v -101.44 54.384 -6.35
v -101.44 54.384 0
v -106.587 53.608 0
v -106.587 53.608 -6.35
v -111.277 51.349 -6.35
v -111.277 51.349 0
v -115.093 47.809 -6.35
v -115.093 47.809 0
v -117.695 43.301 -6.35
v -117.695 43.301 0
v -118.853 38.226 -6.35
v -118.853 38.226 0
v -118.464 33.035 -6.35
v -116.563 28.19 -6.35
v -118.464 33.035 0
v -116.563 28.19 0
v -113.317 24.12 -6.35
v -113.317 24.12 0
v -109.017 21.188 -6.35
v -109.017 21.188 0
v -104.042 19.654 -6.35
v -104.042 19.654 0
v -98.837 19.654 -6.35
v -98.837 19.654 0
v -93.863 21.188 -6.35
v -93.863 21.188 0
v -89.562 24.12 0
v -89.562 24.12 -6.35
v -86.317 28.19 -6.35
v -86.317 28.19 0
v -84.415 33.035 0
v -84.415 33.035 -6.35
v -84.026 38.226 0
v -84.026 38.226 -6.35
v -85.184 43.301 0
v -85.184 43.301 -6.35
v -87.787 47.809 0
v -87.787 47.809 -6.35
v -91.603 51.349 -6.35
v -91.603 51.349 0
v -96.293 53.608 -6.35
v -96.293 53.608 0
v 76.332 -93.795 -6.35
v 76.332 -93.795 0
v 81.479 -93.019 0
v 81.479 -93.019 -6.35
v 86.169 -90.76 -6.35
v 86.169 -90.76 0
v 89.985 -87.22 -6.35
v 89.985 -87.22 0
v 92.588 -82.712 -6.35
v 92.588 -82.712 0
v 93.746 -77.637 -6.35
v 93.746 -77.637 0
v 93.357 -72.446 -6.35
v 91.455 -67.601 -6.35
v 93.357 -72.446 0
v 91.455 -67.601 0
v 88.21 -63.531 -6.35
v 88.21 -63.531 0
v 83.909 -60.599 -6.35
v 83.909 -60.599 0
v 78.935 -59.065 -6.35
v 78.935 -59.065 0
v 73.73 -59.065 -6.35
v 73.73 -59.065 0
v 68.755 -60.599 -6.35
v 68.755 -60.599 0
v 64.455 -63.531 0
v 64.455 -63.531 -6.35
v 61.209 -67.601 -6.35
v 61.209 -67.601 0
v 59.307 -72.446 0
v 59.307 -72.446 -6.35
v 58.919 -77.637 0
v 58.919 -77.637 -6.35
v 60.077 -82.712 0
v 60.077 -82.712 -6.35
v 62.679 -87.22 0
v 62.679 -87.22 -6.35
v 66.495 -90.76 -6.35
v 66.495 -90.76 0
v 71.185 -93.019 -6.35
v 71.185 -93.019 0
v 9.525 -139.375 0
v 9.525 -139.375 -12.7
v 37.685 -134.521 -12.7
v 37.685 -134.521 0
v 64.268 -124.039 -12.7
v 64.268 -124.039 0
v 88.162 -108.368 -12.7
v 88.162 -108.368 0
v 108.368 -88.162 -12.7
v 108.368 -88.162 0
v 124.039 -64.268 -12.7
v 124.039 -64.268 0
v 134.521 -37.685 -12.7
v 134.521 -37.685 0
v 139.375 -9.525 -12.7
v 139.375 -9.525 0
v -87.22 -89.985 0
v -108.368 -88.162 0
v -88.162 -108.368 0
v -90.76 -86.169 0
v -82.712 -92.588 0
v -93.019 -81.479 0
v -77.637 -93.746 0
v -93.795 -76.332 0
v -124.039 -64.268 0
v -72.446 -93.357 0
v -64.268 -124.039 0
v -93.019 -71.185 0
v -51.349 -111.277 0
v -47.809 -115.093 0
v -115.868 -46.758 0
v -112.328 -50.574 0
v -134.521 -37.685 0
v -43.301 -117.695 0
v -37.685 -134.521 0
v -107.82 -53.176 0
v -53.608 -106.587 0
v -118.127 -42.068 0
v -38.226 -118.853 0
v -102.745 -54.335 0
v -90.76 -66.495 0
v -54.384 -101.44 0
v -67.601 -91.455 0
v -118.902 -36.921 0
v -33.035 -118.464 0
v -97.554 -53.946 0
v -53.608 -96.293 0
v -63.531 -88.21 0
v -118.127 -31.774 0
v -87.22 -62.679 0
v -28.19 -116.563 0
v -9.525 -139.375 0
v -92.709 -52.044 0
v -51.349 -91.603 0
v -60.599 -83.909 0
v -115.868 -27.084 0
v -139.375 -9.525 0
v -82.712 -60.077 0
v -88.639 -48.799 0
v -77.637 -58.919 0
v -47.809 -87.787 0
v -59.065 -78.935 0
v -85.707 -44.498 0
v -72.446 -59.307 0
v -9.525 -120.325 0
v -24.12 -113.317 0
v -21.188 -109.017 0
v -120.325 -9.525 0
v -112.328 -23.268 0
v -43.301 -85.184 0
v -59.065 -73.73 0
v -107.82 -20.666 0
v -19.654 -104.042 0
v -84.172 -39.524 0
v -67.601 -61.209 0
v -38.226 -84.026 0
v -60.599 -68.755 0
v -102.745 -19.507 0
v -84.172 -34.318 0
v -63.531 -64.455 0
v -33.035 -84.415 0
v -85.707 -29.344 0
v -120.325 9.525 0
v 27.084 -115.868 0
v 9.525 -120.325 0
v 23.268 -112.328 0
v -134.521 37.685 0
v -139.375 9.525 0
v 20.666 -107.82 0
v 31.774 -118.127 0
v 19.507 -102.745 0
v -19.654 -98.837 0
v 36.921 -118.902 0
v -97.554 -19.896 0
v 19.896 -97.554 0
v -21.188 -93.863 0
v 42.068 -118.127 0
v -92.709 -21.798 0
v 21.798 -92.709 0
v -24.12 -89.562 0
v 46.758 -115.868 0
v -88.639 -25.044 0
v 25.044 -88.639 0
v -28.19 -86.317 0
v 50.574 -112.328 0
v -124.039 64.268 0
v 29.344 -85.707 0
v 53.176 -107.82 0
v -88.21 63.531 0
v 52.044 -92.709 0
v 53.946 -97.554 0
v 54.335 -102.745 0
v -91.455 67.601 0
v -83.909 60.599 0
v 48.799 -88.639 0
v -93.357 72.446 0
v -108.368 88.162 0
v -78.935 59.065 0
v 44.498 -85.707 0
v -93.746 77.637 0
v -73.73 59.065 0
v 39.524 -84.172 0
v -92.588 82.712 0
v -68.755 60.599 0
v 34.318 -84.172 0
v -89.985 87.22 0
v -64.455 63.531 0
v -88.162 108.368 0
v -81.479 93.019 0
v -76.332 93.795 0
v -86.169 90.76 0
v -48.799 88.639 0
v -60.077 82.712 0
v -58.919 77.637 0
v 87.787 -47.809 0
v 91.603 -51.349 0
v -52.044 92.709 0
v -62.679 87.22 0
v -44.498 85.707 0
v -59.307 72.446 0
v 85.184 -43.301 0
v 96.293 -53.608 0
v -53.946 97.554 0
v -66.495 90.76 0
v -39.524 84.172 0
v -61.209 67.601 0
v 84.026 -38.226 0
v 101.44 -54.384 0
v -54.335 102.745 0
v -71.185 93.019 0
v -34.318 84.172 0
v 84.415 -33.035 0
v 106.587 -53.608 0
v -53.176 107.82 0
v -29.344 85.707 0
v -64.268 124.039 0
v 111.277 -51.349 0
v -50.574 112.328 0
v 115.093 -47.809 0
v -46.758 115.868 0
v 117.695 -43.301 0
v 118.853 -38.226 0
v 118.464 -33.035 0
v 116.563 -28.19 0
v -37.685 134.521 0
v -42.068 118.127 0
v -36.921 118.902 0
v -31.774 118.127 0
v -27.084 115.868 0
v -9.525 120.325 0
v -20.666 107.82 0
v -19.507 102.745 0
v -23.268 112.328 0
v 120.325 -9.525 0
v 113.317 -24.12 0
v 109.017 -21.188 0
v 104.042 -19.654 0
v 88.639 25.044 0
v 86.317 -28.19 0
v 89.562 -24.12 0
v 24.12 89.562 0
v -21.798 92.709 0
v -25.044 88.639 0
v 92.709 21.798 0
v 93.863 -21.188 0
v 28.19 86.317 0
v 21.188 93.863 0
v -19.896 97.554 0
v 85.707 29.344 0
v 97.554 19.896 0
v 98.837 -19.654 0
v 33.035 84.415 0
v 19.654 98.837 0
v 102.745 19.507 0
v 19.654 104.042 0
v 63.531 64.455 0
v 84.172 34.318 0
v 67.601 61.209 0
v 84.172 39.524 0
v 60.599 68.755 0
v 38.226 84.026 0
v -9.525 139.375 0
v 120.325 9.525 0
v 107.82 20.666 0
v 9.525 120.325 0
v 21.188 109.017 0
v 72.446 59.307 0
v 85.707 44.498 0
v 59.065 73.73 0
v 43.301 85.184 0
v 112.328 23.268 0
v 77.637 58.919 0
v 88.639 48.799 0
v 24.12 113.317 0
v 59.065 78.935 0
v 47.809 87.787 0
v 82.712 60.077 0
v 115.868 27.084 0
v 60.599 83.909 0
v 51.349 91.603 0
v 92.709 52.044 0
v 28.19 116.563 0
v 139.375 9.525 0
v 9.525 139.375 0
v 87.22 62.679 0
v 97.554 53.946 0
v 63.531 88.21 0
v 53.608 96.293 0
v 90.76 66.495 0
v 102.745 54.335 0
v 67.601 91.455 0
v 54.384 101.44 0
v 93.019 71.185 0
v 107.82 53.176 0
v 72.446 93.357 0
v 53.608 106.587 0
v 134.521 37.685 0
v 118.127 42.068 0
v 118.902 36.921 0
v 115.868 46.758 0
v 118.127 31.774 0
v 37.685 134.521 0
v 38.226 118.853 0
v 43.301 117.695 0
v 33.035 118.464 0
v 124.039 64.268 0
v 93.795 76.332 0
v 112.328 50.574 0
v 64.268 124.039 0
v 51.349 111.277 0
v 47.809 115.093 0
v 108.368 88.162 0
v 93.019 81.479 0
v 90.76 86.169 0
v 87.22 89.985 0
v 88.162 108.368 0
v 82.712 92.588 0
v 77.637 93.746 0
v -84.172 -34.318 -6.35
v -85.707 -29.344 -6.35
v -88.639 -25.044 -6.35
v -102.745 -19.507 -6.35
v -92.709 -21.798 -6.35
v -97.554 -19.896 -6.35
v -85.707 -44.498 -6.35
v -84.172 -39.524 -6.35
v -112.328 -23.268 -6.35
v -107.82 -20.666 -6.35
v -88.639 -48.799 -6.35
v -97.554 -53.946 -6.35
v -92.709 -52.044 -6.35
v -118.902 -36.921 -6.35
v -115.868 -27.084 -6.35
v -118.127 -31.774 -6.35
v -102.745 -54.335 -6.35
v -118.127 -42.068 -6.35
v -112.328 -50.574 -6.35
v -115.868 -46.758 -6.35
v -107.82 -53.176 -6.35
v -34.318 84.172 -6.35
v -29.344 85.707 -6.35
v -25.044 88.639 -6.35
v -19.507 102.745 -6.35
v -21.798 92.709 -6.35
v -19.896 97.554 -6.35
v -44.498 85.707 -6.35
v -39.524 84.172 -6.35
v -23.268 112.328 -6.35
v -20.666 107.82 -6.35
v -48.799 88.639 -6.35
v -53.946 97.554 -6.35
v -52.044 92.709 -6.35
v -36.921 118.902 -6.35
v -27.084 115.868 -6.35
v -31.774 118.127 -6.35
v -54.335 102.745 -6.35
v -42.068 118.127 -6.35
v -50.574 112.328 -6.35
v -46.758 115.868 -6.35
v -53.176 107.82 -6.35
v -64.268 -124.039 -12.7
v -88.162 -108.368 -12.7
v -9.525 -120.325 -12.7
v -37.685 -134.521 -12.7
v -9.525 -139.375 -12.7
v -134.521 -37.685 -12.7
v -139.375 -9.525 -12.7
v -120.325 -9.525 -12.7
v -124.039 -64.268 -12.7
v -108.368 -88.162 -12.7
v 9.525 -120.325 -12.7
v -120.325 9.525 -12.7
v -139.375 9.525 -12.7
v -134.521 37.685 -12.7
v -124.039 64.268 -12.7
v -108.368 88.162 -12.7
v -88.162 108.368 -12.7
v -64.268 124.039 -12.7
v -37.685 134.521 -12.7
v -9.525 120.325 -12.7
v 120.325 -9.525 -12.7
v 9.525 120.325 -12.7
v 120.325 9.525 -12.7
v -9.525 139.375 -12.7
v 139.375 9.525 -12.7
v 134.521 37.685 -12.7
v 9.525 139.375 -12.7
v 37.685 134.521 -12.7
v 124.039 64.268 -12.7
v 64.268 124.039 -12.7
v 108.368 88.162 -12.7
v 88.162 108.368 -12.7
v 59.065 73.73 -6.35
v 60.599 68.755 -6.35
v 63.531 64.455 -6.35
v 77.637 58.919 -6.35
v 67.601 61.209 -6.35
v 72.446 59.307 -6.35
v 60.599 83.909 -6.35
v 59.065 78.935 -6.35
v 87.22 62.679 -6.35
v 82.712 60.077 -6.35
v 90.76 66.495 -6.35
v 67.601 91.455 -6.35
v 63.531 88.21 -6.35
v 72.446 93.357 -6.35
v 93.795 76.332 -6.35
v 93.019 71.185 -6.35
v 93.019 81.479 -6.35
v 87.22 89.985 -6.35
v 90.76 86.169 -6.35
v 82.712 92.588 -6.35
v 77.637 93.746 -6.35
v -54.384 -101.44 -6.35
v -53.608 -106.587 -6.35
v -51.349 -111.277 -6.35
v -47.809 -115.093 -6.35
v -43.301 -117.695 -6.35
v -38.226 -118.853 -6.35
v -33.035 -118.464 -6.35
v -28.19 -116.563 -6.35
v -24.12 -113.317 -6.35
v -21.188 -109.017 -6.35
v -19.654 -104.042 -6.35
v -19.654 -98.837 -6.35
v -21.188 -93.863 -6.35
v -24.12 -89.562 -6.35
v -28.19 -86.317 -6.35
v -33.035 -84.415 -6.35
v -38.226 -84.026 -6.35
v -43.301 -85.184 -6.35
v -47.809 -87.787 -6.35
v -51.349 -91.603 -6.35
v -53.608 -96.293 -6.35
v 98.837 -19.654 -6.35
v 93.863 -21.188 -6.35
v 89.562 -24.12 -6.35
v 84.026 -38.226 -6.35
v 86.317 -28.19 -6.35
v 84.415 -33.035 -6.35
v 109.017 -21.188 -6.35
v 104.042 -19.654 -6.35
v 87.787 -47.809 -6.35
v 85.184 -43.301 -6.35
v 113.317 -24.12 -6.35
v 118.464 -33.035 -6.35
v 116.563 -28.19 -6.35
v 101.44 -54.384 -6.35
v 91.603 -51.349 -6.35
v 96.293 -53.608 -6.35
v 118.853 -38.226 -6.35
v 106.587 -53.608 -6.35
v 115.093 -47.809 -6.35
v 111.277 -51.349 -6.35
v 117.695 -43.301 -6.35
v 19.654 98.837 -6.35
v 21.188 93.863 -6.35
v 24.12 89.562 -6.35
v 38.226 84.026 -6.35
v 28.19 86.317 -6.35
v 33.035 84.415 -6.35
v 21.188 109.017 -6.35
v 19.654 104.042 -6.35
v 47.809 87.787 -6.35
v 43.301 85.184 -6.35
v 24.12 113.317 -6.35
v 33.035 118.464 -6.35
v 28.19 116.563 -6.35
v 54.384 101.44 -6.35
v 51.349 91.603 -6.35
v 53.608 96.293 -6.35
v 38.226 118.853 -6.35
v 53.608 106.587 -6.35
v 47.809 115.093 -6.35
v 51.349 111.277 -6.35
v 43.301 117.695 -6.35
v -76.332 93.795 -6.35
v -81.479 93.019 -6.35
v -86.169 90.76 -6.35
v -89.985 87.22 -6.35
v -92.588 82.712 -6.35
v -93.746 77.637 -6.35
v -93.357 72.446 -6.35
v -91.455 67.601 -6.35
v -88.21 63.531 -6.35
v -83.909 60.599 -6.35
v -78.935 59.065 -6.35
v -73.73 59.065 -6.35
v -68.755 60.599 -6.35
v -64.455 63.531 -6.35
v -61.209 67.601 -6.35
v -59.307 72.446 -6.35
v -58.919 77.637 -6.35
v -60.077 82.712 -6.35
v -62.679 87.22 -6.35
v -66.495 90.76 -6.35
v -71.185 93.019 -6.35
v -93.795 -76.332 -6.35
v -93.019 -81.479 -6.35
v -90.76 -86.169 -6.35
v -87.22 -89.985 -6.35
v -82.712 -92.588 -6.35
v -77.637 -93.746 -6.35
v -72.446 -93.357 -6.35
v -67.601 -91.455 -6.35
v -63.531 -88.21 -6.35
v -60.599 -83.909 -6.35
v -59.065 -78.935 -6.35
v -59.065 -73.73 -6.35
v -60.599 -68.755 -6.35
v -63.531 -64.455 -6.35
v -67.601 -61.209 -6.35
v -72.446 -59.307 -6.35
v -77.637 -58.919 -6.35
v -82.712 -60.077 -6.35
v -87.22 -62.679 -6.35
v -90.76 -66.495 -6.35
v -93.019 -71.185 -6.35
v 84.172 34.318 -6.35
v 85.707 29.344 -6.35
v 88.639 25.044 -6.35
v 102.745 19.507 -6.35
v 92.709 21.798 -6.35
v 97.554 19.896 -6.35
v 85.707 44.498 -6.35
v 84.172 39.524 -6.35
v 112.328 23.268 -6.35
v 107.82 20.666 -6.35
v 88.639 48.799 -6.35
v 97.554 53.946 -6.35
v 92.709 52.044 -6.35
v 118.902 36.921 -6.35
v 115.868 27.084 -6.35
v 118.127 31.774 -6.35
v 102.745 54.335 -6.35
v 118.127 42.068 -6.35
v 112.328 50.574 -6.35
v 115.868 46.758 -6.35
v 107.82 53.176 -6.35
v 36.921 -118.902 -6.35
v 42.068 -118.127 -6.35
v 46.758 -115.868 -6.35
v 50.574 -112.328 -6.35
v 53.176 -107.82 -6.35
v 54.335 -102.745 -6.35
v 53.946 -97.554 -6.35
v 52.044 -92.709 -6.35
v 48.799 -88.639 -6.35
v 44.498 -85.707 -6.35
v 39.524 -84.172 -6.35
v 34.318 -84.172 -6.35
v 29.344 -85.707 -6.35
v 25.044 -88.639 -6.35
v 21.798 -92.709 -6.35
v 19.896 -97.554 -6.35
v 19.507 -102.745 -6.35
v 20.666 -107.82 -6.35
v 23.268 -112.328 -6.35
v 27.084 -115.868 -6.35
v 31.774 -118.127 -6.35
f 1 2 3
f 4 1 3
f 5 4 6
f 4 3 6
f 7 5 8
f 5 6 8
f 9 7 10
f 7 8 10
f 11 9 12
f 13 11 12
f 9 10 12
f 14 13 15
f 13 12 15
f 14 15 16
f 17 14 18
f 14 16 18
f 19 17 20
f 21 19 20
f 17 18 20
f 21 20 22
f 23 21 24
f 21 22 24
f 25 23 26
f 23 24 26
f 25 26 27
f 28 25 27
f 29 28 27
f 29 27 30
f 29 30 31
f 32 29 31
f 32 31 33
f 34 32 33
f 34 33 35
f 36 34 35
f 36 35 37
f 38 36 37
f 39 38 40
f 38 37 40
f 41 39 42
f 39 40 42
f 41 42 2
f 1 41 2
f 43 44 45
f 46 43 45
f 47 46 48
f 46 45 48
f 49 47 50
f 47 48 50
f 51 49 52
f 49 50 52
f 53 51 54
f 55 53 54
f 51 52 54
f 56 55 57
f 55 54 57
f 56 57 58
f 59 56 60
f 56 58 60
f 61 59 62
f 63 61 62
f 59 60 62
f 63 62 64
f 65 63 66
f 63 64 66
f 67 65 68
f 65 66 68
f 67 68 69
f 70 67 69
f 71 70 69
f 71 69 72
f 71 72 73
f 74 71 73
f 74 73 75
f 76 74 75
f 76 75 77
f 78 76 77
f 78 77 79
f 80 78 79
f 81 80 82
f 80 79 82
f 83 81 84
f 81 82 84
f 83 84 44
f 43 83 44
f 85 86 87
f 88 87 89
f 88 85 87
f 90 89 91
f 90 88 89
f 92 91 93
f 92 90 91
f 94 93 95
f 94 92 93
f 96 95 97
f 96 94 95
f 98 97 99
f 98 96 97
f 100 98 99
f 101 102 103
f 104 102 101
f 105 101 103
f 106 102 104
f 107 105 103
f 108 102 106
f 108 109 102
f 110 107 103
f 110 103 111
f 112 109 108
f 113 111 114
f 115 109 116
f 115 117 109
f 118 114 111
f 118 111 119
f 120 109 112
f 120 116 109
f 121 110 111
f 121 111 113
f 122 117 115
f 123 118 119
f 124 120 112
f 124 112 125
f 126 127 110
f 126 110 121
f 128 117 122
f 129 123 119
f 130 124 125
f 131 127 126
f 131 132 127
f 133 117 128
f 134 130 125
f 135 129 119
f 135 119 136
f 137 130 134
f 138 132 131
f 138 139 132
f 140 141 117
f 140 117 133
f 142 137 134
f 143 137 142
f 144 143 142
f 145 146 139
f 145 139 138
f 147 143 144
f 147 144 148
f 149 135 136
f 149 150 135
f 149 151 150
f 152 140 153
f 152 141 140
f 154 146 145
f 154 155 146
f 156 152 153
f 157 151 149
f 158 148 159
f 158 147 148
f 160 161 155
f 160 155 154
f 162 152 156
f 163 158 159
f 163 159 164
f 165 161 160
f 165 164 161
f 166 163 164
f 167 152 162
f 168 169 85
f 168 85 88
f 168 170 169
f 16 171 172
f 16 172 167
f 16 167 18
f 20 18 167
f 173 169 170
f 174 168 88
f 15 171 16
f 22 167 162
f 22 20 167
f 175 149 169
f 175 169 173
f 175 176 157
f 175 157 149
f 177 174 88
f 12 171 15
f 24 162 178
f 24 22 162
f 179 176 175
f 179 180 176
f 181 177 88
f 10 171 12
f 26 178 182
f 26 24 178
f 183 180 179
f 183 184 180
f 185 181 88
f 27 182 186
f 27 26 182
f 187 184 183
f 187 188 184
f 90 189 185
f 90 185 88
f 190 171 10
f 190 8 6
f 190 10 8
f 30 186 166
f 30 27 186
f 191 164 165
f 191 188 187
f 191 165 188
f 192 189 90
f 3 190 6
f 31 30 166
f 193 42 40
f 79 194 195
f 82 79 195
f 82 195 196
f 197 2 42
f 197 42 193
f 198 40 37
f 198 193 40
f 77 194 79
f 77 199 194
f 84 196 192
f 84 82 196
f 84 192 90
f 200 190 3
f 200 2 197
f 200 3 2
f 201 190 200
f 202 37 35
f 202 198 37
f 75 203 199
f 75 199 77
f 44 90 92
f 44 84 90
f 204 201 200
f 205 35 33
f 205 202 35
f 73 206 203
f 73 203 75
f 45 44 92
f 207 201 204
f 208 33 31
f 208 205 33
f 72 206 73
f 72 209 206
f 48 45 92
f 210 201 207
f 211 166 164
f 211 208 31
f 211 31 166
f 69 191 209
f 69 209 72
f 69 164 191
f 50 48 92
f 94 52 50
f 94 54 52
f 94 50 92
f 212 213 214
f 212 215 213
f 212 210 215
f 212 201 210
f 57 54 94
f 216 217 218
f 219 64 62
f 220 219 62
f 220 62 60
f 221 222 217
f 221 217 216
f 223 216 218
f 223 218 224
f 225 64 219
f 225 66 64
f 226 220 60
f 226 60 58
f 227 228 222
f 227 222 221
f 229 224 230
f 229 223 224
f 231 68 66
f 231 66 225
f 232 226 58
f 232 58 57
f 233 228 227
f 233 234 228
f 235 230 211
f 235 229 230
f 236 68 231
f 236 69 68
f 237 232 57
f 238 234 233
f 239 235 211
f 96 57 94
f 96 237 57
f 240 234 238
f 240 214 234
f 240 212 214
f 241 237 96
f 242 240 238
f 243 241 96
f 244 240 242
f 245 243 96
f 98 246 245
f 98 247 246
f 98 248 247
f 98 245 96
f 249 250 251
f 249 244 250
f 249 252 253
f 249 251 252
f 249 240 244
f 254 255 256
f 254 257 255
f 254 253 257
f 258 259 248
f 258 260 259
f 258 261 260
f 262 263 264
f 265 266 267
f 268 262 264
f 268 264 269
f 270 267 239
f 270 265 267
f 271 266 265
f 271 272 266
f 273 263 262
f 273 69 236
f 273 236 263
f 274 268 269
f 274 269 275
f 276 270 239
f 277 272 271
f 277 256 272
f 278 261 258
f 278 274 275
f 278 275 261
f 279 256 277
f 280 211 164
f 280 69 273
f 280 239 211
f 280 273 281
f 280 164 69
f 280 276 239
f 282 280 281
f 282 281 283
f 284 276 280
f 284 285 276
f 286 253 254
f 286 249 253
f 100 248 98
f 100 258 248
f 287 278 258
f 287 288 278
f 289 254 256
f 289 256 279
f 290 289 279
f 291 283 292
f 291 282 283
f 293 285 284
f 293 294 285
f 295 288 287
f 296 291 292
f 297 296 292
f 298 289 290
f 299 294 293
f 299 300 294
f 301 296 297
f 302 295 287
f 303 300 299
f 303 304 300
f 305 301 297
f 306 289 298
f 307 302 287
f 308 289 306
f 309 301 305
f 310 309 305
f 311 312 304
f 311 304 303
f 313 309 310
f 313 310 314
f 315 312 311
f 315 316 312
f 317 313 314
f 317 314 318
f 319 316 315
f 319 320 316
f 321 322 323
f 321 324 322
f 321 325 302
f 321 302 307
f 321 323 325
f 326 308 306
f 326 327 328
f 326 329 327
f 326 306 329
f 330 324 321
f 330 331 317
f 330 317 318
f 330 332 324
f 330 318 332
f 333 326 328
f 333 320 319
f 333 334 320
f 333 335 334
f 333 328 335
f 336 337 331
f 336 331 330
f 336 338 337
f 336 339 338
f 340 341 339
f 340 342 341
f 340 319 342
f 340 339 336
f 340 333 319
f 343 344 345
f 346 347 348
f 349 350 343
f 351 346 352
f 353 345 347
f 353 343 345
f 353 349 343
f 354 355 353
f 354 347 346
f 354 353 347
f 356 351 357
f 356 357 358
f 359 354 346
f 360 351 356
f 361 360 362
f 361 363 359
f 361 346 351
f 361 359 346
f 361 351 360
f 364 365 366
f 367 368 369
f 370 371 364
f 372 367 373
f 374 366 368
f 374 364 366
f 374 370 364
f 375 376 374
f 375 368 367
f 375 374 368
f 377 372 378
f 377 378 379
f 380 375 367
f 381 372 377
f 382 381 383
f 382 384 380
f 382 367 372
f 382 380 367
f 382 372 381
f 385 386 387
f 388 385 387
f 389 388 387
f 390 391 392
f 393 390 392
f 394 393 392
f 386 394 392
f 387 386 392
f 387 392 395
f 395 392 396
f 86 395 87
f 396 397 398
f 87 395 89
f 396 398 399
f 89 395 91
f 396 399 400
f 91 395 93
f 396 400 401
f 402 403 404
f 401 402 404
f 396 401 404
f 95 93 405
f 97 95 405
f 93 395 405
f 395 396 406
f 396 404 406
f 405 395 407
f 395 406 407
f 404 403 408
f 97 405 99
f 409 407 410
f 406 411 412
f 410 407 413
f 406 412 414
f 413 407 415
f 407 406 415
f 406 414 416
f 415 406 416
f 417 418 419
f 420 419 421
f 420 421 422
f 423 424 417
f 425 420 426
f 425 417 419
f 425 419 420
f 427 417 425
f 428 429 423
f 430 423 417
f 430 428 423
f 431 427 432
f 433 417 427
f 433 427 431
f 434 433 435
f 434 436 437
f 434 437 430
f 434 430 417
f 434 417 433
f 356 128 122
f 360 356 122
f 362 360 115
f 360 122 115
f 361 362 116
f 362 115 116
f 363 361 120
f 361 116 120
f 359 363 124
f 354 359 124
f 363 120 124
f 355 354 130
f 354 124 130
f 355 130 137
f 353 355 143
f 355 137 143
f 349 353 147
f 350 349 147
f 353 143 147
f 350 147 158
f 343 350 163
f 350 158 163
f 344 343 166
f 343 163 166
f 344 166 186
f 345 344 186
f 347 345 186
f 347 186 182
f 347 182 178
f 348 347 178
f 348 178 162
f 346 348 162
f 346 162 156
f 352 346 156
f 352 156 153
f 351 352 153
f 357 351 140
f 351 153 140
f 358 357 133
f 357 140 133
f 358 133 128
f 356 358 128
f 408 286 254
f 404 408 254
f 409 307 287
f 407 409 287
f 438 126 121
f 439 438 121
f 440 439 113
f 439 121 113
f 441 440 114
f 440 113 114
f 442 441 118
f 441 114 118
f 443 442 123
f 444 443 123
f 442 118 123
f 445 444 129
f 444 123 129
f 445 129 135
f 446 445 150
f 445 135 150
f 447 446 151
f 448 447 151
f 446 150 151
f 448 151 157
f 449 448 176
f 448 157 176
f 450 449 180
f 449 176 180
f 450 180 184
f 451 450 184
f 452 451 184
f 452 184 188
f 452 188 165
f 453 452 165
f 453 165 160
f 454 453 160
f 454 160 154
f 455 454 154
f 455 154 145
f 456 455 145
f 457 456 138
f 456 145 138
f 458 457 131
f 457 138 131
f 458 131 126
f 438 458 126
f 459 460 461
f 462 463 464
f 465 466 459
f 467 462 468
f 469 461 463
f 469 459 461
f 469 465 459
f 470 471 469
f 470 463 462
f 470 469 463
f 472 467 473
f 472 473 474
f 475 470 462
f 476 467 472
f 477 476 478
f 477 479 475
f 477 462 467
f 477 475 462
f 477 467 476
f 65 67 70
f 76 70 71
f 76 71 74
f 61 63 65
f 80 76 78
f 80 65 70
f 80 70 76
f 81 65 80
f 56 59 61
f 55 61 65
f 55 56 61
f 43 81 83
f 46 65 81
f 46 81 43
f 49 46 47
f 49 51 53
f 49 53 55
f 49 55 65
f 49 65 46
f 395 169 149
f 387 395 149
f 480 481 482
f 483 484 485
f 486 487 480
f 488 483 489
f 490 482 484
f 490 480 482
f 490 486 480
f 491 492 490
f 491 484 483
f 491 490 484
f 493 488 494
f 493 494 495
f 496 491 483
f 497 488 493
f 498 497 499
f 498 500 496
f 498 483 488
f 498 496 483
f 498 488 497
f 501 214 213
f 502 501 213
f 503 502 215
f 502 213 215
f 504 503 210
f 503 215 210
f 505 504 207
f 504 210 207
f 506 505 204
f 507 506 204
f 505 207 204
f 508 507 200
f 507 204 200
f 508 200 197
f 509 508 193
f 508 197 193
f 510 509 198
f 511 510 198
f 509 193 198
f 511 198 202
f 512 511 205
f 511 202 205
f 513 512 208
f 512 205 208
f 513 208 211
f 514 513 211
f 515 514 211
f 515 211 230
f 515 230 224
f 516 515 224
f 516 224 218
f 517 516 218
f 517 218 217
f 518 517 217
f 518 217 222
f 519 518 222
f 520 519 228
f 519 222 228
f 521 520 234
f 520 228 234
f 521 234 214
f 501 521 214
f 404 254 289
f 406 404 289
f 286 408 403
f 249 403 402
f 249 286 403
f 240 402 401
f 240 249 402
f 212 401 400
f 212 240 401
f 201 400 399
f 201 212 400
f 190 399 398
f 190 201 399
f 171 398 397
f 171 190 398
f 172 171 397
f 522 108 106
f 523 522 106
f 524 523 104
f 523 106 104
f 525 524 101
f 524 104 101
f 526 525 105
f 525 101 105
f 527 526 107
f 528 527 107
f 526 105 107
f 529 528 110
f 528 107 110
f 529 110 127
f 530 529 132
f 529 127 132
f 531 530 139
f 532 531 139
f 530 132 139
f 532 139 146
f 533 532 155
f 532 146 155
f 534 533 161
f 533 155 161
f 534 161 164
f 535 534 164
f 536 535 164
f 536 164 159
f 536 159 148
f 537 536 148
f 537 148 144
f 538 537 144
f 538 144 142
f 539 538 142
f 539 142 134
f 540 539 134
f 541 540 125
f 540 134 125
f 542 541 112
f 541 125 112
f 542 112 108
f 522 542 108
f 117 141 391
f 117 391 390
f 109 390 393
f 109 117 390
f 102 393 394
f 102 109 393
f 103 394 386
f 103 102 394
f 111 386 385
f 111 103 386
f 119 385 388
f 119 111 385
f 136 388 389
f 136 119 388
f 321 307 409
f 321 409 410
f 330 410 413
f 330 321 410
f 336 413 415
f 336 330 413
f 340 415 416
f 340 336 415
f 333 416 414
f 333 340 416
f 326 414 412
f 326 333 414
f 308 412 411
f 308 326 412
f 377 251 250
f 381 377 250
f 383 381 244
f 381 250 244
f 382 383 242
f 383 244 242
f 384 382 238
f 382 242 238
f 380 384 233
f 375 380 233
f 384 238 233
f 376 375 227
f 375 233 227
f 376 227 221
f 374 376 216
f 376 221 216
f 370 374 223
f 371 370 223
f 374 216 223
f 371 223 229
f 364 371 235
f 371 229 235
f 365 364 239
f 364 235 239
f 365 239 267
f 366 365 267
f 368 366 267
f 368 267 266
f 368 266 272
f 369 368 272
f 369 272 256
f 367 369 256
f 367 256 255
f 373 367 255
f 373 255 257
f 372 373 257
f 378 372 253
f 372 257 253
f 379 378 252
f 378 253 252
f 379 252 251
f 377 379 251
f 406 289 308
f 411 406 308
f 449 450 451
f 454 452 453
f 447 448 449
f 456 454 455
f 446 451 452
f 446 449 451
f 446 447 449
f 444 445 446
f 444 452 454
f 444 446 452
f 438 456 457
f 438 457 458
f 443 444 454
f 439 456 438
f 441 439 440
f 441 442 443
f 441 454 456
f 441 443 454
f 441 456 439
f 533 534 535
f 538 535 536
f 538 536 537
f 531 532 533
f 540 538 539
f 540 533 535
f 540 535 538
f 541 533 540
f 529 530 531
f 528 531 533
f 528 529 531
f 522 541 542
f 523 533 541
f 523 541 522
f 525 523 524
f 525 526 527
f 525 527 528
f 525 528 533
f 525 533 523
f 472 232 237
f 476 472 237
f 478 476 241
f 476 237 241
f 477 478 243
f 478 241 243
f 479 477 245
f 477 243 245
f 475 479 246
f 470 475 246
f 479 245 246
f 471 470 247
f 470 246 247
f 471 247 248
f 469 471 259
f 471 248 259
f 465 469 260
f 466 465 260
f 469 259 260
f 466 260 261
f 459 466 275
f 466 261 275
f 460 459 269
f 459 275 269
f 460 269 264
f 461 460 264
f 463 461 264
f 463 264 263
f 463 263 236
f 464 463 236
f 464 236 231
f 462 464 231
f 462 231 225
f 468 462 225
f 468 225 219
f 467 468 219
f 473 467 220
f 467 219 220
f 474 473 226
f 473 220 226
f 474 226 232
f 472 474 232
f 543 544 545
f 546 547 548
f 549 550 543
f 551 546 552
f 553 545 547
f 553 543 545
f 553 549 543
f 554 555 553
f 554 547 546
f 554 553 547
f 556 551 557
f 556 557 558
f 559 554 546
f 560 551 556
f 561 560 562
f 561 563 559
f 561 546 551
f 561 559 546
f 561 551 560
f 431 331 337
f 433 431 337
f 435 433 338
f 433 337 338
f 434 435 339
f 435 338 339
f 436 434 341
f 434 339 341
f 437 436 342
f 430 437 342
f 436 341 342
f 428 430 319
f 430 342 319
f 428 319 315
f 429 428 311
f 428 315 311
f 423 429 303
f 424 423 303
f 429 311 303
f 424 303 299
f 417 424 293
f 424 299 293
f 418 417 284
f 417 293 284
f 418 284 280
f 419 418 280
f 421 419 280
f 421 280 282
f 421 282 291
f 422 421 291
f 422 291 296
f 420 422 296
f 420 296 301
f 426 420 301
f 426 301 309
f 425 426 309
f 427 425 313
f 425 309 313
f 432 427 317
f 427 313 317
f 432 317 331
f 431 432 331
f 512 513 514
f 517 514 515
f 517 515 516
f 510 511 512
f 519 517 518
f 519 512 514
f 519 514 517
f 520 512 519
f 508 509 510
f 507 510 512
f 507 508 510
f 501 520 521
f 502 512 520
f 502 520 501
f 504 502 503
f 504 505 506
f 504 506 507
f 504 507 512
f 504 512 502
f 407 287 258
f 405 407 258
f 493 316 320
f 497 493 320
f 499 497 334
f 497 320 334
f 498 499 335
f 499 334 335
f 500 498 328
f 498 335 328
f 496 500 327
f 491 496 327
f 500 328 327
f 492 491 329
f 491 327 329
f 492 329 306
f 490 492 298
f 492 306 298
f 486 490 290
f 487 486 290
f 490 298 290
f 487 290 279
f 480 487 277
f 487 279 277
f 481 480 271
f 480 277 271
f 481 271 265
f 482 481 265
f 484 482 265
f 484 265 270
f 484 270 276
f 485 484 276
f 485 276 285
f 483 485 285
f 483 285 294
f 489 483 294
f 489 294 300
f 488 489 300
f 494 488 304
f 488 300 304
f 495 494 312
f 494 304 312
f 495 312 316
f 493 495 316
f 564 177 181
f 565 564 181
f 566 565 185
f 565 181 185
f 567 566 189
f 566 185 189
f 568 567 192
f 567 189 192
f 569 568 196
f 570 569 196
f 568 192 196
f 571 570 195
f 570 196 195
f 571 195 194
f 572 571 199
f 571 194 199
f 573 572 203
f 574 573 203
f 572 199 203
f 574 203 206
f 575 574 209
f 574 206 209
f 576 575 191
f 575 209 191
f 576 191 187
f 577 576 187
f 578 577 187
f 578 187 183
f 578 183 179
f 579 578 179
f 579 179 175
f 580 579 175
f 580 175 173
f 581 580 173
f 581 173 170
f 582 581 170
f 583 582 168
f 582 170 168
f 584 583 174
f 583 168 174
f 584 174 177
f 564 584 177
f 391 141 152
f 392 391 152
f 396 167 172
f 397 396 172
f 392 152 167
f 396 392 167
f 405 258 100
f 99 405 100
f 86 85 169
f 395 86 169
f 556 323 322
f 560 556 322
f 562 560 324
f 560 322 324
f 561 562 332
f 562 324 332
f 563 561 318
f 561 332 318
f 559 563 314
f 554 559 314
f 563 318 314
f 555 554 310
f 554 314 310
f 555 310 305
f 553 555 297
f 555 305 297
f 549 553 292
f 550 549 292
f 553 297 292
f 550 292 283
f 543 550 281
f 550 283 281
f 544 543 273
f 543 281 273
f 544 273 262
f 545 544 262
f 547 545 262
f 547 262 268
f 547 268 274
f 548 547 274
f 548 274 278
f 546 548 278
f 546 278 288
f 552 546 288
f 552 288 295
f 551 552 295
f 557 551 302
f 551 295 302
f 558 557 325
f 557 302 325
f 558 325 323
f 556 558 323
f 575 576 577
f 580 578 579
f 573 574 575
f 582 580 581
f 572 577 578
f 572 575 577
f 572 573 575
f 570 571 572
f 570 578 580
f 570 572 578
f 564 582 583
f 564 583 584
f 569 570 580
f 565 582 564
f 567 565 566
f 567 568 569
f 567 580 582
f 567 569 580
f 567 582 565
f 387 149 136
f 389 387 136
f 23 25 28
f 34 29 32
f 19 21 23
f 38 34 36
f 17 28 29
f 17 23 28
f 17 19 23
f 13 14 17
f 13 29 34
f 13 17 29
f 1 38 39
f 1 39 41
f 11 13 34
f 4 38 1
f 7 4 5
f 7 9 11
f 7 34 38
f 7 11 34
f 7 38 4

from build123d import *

# Parameters (mm, degrees)
F0_R            = 44.8437
F0_R_2          = 17.4625
F0_W            = 19.05
F0_H            = 6.35
F1_DEPTH        = 12.7
F2_DEPTH        = 6.35
F2_COPIES_COUNT = 4
F3_DEPTH        = 12.701
F3_COPIES_COUNT = 4


# Not quite as in the source:
# - a pattern or mirror of a feature is missing from the dataset's text; its kind, count and spacing are read off the source's solid


with BuildPart() as f1:
    # F0 (on Top) → F1 (new body)
    with BuildSketch(Plane.XY):
        with BuildLine():
            ThreePointArc((-9.525, 139.3749058296), (-95.3557746023, -102.0948884617), (139.7, 0))
            ThreePointArc((139.7, 0), (102.0948884617, 95.3557746023), (9.525, 139.3749058296))
            Line((9.525, 139.3749058296), (9.525, 120.3249058296))
            Line((9.525, 120.3249058296), (9.525, 113.9749058296))
            Line((9.525, 113.9749058296), (-9.525, 113.9749058296))
            Line((-9.525, 113.9749058296), (-9.525, 120.3249058296))
            Line((-9.525, 120.3249058296), (-9.525, 139.3749058296))
        make_face()
        Circle(F0_R, mode=Mode.SUBTRACT)
        with Locations((101.4398184138, 36.921074472)):
            Circle(F0_R_2, mode=Mode.SUBTRACT)
        with Locations((36.921074472, 101.4398184138)):
            Circle(F0_R_2, mode=Mode.SUBTRACT)
        with Locations((76.3321770291, 76.3321770291)):
            Circle(F0_R_2, mode=Mode.SUBTRACT)
        with BuildLine():
            Line((9.525, 120.3249058296), (9.525, 139.3749058296))
            ThreePointArc((9.525, 139.3749058296), (0, 139.7), (-9.525, 139.3749058296))
            Line((-9.525, 139.3749058296), (-9.525, 120.3249058296))
            Line((-9.525, 120.3249058296), (9.525, 120.3249058296))
        make_face()
        with Locations((36.921074472, 101.4398184138)):
            Circle(F0_R_2)
        with Locations((76.3321770291, 76.3321770291)):
            Circle(F0_R_2)
        with Locations((101.4398184138, 36.921074472)):
            Circle(F0_R_2)
        with Locations((0, 117.1499058296)):
            Rectangle(F0_W, F0_H)
        Circle(F0_R)
    extrude(amount=-F1_DEPTH)

    # F0 (on Top) → F2 (cut)
    with BuildSketch(Plane.XY):
        with Locations((36.921074472, 101.4398184138)):
            Circle(F0_R_2)
        with Locations((76.3321770291, 76.3321770291)):
            Circle(F0_R_2)
        with Locations((101.4398184138, 36.921074472)):
            Circle(F0_R_2)
    f2 = extrude(amount=-F2_DEPTH, mode=Mode.SUBTRACT)

    # F2_copies: F2 ×4 about axis
    f2_copies_axis = Axis((0, 0, 0), (0, 0, 1))
    for i in range(1, F2_COPIES_COUNT):
        add(f2.rotate(f2_copies_axis, i * 360 / F2_COPIES_COUNT), mode=Mode.SUBTRACT)

    # F0 (on Top) → F3 (cut, through all)
    with BuildSketch(Plane.XY):
        with BuildLine():
            Line((9.525, 120.3249058296), (9.525, 139.3749058296))
            ThreePointArc((9.525, 139.3749058296), (0, 139.7), (-9.525, 139.3749058296))
            Line((-9.525, 139.3749058296), (-9.525, 120.3249058296))
            Line((-9.525, 120.3249058296), (9.525, 120.3249058296))
        make_face()
    f3 = extrude(amount=-F3_DEPTH, mode=Mode.SUBTRACT)

    # F3_copies: F3 ×4 about axis
    f3_copies_axis = Axis((0, 0, 0), (0, 0, 1))
    for i in range(1, F3_COPIES_COUNT):
        add(f3.rotate(f3_copies_axis, i * 360 / F3_COPIES_COUNT), mode=Mode.SUBTRACT)


solid = f1.part
